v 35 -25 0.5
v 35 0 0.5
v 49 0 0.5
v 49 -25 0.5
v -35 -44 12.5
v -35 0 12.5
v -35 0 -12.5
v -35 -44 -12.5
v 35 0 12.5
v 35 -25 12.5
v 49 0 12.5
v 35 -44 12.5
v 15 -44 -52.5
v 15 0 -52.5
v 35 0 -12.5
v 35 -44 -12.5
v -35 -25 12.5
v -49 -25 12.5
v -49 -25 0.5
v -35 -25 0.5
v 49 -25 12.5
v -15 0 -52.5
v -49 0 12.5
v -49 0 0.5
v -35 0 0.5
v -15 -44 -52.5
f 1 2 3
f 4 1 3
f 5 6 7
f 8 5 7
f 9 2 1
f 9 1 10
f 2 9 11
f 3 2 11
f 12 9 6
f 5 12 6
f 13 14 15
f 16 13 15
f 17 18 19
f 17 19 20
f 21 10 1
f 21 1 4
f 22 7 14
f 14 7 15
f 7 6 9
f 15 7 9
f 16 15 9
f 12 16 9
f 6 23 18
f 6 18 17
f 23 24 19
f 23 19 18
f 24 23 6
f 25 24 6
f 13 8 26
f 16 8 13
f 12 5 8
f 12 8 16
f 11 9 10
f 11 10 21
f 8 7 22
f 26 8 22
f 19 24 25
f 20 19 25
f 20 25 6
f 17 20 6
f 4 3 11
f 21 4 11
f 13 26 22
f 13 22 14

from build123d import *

# Parameters (mm, degrees)
F0_W     = 14
F0_H     = 12
F1_DEPTH = 25
F2_DEPTH = 44


with BuildPart() as f1:
    # F0 (on Front) → F1 (new body)
    with BuildSketch(Plane.XZ):
        with Locations((-42, 6.5)):
            Rectangle(F0_W, F0_H)
        with Locations((42, 6.5)):
            Rectangle(F0_W, F0_H)
    extrude(amount=F1_DEPTH)


with BuildPart() as f2:
    # F0 (on Front) → F2 (new body)
    with BuildSketch(Plane.XZ):
        Polygon((-35, 0.5), (-35, -12.5), (35, -12.5), (35, 0.5), (35, 12.5), (-35, 12.5), align=None)
        Polygon((35, -12.5), (-35, -12.5), (-15, -52.5), (15, -52.5), align=None)
    extrude(amount=F2_DEPTH)


solid = Compound([f1.part, f2.part])
